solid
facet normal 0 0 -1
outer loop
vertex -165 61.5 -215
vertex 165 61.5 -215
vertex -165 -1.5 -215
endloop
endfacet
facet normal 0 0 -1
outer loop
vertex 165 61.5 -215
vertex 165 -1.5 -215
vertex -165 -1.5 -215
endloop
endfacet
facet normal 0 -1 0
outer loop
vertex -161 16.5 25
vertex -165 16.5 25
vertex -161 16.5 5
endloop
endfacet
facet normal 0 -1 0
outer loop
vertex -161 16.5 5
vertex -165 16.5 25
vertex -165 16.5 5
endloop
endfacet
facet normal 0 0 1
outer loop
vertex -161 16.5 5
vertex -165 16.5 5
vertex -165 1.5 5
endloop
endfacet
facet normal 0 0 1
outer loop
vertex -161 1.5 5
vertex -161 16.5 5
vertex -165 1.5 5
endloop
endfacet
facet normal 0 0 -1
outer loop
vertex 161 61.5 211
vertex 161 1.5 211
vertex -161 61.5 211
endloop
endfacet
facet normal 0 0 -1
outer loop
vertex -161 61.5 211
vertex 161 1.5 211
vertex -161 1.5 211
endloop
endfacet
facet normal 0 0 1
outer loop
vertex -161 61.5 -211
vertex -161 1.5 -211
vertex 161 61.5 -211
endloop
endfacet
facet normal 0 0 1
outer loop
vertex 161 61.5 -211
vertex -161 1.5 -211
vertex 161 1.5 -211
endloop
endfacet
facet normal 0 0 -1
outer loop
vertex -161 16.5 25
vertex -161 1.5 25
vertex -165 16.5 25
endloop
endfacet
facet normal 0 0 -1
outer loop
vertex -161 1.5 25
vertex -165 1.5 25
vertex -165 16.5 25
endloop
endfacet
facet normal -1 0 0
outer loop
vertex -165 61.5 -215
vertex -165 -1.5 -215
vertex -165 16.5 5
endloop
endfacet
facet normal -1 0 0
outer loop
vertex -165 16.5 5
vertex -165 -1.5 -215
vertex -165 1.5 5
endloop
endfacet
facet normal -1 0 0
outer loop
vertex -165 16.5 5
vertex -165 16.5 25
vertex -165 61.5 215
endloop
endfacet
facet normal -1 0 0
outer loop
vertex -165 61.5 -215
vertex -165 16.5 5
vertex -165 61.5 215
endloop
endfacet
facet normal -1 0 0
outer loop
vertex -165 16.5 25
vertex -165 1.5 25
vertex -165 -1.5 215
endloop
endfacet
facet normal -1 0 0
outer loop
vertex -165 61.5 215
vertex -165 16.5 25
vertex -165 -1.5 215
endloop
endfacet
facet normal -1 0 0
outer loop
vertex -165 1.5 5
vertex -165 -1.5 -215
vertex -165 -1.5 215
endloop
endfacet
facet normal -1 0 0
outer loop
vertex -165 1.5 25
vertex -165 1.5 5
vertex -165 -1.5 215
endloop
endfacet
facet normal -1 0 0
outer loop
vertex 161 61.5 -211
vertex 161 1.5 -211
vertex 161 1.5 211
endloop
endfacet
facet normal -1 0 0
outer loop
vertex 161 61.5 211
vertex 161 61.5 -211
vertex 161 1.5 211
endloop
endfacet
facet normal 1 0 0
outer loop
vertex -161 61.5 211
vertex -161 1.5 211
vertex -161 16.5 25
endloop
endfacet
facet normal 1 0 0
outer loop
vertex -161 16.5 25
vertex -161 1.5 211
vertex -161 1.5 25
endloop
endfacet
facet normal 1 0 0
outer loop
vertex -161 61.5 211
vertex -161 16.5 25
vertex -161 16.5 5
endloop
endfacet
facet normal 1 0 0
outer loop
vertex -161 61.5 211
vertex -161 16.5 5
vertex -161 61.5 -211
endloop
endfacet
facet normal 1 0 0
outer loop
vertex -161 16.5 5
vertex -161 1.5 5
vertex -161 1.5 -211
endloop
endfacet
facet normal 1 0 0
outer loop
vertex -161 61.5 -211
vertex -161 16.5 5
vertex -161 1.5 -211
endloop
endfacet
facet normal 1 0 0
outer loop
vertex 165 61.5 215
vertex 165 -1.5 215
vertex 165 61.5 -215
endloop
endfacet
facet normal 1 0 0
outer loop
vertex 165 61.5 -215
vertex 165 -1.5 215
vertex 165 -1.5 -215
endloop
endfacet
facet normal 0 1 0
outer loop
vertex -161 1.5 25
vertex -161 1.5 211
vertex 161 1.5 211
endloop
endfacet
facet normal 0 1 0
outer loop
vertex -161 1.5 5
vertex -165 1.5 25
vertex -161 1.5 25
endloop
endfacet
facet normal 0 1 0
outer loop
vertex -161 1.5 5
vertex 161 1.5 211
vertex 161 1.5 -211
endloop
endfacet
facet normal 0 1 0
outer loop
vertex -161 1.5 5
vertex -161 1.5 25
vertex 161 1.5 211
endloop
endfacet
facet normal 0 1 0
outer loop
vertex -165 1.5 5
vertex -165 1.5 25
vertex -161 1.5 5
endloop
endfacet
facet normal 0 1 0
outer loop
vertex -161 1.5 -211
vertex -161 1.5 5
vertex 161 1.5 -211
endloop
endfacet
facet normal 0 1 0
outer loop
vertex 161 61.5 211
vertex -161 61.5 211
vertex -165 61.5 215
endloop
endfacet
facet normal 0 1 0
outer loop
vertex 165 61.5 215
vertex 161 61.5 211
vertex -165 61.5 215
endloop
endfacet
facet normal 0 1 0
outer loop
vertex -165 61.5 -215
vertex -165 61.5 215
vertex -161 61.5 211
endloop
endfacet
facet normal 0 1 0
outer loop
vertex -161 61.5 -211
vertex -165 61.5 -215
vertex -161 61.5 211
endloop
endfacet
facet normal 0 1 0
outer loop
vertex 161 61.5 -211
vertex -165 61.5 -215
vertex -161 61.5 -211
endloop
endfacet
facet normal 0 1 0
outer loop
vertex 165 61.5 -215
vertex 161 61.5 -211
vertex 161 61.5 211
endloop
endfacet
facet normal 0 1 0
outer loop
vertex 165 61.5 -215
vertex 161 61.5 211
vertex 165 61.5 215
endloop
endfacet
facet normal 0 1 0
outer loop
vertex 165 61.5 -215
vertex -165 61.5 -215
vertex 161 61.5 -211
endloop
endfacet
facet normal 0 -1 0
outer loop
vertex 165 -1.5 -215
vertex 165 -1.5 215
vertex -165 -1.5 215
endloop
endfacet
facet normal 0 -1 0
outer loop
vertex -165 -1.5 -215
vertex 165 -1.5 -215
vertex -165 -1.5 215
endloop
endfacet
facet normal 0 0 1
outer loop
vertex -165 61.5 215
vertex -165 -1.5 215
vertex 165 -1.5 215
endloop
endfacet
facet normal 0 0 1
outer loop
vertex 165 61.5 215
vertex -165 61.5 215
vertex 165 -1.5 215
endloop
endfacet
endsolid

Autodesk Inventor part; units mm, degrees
ref_plane "YZ Plane" through (0, 0, 0) normal (1, 0, 0) x (0, 1, 0)
ref_plane "XZ Plane" through (0, 0, 0) normal (0, 1, 0) x (-1, 0, 0)
ref_plane "XY Plane" through (0, 0, 0) normal (0, 0, 1) x (1, 0, 0)
sketch "Szkic1" plane through (0, 0, 0) normal (0, 1, 0) x (-1, 0, 0)
  line L0 (-165, -215) -> (165, -215)
  line L1 (165, -215) -> (165, 215)
  line L2 (165, 215) -> (-165, 215)
  line L3 (-165, 215) -> (-165, -215)
  line L4 (-165, -215) -> (165, 215) construction
  line L5 (165, -215) -> (-165, 215) construction
  point P0 (0, 0)
  dimension "d0" = 430
  dimension "d1" = 330
extrude "Wyciągnięcie proste1" add sketch "Szkic1" along normal mid plane 3
sketch "Szkic2" plane through (0, 1.5, 0) normal (0, 1, 0) x (1, 0, 0)
  line L0 (161, -211) -> (-161, -211)
  line L1 (-161, -211) -> (-161, 211)
  line L2 (-161, 211) -> (161, 211)
  line L3 (161, 211) -> (161, -211)
  line L4 (161, -211) -> (-161, 211) construction
  line L5 (-161, -211) -> (161, 211) construction
  line L6 (-165, 215) -> (-165, -215) projected
  line L7 (-165, -215) -> (165, -215) projected
  line L8 (165, -215) -> (165, 215) projected
  line L9 (165, 215) -> (-165, 215) projected
  point P0 (0, 0)
  dimension "d4" = 322
  dimension "d5" = 422
extrude "Wyciągnięcie proste2" add sketch "Szkic2" along normal blind 60
sketch "Szkic4" plane through (-165, -1.5, -215) normal (-1, 0, 0) x (0, 0, 1)
  line L0 (426, 3) -> (4, 3) projected
  line L1 (220, 3) -> (240, 3)
  line L2 (240, 3) -> (240, 18)
  line L3 (240, 18) -> (220, 18)
  line L4 (220, 18) -> (220, 3)
  line L5 (430, 0) -> (430, 63) projected
  point P0 (215, 1.5)
  dimension "d13" = 20
  dimension "d14" = 15
  dimension "d15" = 190
extrude "Wyciągnięcie proste4" cut sketch "Szkic4" against normal up to surface (4 mm away)
properties part number "BaseFloor"
